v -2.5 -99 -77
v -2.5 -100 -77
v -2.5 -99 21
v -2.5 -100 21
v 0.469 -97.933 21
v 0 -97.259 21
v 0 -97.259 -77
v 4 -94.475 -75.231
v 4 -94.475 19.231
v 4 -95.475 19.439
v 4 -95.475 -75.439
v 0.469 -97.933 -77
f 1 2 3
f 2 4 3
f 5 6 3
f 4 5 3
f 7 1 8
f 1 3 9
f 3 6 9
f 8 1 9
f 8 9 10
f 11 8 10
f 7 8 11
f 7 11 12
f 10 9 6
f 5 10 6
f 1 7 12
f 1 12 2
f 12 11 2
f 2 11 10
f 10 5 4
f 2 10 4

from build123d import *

# Parameters (mm, degrees)
SALIENTE_EXTRUIR2_DEPTH      = 21
SALIENTE_EXTRUIR2_DEPTH_BACK = 77
CORTAR_EXTRUIR2_DEPTH        = 5.534624471


with BuildPart() as part:
    # Croquis1 → Saliente-Extruir2 (new body, two sides)
    with BuildSketch(Plane.XY) as saliente_extruir2_sk:
        Polygon((4, -95.47461527), (-2.5, -100), (-2.5, -99), (4, -94.47461527), align=None)
    extrude(amount=SALIENTE_EXTRUIR2_DEPTH)
    extrude(saliente_extruir2_sk.sketch, amount=-SALIENTE_EXTRUIR2_DEPTH_BACK)

    # Croquis3 → Cortar-Extruir2 (cut, through all)
    with BuildSketch(Plane(origin=(45.607014753, -65.507269237, 0), x_dir=(0.820689363, 0.571374632, 0), z_dir=(-0.571374632, 0.820689363, 0))):
        Polygon((-50.697641098, 77), (-50.697641098, 75.231357415), (-55.571592416, 77), align=None)
        Polygon((-50.697641098, -21), (-50.697641098, -19.231357415), (-55.571592416, -21), align=None)
    extrude(amount=-CORTAR_EXTRUIR2_DEPTH, mode=Mode.SUBTRACT)


solid = part.part
